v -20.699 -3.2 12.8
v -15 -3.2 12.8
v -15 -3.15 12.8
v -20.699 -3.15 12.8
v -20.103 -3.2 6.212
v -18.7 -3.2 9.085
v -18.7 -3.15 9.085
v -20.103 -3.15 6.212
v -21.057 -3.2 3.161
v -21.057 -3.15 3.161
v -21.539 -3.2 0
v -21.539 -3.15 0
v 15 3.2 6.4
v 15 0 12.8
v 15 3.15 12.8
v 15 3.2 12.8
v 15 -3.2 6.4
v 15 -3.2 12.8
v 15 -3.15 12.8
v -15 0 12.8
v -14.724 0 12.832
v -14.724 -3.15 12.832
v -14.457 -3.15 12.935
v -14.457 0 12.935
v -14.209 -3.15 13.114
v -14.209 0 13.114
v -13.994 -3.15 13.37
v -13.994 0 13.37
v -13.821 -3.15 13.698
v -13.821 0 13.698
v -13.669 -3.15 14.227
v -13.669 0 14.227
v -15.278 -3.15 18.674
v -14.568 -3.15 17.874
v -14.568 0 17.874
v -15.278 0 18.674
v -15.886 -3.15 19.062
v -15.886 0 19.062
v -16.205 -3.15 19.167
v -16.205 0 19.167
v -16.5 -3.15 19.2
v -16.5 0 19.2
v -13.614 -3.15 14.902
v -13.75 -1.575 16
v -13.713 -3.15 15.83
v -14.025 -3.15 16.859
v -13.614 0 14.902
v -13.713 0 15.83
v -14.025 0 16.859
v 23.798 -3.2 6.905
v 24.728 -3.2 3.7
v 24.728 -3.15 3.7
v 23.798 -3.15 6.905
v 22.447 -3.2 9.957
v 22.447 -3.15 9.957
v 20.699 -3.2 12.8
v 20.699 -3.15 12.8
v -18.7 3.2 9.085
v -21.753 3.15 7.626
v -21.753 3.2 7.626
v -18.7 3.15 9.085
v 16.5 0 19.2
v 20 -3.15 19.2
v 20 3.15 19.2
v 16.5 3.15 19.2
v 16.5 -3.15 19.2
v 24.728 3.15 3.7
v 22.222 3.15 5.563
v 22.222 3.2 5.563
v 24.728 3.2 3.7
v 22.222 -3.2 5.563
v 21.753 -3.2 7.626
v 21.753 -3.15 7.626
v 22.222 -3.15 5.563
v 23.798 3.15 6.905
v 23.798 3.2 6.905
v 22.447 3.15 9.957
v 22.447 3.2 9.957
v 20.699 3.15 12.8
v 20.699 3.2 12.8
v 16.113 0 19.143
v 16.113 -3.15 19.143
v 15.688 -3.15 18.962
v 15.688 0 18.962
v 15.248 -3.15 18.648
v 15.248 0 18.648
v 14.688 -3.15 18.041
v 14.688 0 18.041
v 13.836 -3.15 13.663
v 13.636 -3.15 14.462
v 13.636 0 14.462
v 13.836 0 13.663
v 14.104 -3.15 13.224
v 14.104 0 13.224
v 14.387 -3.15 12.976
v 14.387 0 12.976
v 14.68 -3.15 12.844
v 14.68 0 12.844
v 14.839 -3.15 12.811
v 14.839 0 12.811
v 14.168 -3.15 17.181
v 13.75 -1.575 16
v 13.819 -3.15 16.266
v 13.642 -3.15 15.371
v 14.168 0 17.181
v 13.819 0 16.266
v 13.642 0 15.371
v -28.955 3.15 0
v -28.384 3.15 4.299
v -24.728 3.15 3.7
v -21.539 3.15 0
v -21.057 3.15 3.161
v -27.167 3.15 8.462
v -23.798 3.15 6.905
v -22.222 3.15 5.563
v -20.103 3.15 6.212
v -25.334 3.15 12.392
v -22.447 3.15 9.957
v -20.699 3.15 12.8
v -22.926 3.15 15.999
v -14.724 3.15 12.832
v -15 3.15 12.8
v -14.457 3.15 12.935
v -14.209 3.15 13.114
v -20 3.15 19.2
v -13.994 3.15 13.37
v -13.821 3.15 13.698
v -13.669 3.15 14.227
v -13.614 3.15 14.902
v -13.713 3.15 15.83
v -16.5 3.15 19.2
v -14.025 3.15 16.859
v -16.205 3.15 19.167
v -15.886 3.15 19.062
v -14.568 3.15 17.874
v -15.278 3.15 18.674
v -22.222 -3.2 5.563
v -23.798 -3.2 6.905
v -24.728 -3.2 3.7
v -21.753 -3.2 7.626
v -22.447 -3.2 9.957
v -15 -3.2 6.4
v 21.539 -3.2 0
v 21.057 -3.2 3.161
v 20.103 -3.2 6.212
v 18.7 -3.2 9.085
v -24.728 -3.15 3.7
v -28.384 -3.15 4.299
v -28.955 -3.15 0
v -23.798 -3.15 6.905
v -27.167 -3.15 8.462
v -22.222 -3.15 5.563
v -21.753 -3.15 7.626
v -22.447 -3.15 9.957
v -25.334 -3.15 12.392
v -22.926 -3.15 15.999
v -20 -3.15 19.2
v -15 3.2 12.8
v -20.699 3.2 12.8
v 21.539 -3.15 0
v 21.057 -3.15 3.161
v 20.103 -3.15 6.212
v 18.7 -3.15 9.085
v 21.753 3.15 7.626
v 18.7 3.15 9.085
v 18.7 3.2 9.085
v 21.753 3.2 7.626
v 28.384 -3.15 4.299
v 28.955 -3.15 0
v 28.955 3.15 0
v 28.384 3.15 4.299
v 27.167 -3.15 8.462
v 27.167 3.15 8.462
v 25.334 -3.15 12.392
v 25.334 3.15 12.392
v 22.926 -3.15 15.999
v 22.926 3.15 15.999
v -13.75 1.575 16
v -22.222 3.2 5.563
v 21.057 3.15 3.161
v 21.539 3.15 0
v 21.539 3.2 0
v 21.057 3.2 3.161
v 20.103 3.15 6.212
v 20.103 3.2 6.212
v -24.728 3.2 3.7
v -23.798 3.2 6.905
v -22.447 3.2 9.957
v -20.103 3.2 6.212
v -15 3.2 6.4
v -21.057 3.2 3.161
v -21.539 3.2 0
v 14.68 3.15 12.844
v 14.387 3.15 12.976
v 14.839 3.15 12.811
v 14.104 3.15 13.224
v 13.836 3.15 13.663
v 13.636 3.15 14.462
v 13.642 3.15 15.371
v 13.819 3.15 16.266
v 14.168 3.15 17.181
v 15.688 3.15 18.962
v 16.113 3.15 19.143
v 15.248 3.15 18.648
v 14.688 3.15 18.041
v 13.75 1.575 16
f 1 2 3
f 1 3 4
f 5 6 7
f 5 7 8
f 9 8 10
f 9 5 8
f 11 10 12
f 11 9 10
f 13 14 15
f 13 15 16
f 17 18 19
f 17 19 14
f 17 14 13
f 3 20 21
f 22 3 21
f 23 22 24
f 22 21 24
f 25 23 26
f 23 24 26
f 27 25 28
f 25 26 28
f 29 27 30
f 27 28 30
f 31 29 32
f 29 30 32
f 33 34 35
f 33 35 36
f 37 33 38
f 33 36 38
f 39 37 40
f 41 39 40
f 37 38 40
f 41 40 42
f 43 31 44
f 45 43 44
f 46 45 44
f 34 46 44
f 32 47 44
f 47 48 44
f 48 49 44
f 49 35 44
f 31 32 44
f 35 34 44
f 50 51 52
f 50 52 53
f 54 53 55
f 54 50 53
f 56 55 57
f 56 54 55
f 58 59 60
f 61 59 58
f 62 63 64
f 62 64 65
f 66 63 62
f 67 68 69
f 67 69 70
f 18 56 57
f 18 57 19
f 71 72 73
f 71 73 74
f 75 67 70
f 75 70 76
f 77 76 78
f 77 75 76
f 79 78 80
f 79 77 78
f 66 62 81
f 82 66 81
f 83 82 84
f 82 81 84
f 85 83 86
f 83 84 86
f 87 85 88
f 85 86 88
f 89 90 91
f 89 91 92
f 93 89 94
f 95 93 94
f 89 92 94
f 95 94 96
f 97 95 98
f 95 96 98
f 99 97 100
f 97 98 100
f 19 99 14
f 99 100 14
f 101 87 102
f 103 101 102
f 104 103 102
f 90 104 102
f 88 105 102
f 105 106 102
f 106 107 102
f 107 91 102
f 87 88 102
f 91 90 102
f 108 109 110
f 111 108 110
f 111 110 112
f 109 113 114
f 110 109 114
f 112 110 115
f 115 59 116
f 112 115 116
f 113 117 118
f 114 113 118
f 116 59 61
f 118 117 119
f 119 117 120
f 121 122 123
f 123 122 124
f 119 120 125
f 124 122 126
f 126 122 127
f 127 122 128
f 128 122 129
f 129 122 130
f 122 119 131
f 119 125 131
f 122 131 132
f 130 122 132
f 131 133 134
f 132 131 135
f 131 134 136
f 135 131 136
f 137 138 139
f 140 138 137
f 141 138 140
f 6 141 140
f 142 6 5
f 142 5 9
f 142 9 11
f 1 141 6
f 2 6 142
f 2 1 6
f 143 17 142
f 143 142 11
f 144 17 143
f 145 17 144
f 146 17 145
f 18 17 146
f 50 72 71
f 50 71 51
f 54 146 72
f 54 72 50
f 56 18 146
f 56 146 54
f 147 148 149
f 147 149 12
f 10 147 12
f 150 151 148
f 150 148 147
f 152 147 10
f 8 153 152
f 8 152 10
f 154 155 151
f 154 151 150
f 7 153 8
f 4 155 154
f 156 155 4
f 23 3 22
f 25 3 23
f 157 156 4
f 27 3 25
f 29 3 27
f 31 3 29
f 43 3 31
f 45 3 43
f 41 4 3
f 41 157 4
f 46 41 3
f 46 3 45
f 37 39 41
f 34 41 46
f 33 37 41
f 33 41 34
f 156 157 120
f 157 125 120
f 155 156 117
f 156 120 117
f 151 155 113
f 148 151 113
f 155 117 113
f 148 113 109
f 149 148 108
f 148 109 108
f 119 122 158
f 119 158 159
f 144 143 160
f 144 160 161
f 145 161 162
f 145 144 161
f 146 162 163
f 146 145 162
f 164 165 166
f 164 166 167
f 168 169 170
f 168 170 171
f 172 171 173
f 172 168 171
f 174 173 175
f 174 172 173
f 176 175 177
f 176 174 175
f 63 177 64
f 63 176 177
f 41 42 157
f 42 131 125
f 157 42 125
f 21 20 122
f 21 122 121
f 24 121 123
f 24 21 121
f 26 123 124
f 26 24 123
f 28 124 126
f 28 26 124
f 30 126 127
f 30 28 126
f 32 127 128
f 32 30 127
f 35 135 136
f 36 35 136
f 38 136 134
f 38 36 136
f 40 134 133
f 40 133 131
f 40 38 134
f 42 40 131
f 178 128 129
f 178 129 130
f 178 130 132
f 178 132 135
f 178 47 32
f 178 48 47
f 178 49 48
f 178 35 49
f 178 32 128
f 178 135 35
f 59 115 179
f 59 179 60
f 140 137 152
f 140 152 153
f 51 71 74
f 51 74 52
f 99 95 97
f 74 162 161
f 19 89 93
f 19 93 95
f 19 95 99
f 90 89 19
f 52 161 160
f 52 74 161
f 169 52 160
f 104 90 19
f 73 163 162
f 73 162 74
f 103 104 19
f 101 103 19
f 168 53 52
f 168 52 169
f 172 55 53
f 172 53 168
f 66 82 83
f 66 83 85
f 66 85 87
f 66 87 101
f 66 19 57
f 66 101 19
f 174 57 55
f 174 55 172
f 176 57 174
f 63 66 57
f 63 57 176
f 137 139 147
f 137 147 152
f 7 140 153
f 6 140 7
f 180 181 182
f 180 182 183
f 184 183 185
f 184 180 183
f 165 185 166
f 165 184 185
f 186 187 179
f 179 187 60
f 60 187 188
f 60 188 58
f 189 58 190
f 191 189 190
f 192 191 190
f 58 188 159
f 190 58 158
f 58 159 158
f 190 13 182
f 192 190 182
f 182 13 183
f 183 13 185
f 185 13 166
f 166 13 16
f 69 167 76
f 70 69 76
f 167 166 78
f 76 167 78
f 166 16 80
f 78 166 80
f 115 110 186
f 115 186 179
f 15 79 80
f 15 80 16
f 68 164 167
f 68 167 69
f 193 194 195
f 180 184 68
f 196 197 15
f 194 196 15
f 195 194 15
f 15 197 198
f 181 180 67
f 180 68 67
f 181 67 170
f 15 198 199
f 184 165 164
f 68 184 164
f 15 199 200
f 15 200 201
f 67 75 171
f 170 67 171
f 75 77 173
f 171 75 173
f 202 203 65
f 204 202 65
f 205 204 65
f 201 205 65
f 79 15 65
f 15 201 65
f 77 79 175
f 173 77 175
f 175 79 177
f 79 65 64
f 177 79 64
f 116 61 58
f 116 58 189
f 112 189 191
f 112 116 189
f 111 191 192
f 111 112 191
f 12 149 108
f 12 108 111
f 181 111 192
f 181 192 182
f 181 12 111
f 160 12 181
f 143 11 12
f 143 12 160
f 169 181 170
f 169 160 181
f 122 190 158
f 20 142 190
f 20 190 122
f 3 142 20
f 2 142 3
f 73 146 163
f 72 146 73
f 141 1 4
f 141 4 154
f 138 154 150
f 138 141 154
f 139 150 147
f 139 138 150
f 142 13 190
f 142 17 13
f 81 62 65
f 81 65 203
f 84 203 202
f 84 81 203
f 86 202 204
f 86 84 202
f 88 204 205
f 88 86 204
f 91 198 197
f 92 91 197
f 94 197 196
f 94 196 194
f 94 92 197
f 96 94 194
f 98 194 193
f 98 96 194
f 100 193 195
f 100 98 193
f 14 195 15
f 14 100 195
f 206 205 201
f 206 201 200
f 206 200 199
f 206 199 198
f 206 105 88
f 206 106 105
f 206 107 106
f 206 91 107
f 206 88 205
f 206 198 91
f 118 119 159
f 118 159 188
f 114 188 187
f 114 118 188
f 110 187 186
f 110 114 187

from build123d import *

# Parameters (mm, degrees)
F2_DEPTH = 3.2
F3_DEPTH = 3.15


with BuildPart() as f2:
    # F1 (on Front) → F2 (new body, symmetric)
    with BuildSketch(Plane.XZ):
        with BuildLine():
            Line((-15, 6.4), (-15, 12.8))
            Line((-15, 12.8), (-20.6991873327, 12.8))
            ThreePointArc((-20.6991873327, 12.8), (-23.1740174751, 8.453860578), (-24.7278906085, 3.7))
            Line((-24.7278906085, 3.7), (-22.2216690949, 5.5634498618))
            Line((-22.2216690949, 5.5634498618), (-21.7527165138, 7.6259613264))
            Line((-21.7527165138, 7.6259613264), (-18.7, 9.0853274271))
            ThreePointArc((-18.7, 9.0853274271), (-20.6377910154, 4.7045853769), (-21.5393515296, 0))
            Line((-21.5393515296, 0), (21.5393515296, 0))
            ThreePointArc((21.5393515296, 0), (20.6377910154, 4.7045853769), (18.7, 9.0853274271))
            Line((18.7, 9.0853274271), (21.7527165138, 7.6259613264))
            Line((21.7527165138, 7.6259613264), (22.2216690949, 5.5634498618))
            Line((22.2216690949, 5.5634498618), (24.7278906085, 3.7))
            ThreePointArc((24.7278906085, 3.7), (23.1740174751, 8.453860578), (20.6991873327, 12.8))
            Line((20.6991873327, 12.8), (15, 12.8))
            Line((15, 12.8), (15, 6.4))
            Line((15, 6.4), (-15, 6.4))
        make_face()
    extrude(amount=F2_DEPTH, both=True)

    # F1 (on Front) → F3 (join, symmetric)
    with BuildSketch(Plane.XZ):
        with BuildLine():
            add(Edge.make_bspline(
                [(-15.0000000141, 12.8), (-13, 12.8), (-13.7500000053, 16.0000000226), (-14.5000000106, 19.2000000451), (-16.5000000141, 19.2)],
                knots=[6.0755071268, 6.0755071268, 6.0755071268, 7.6463034607, 7.6463034607, 9.2170997945, 9.2170997945, 9.2170997945], degree=2, weights=[1, 0.7071067787, 1, 0.7071067787, 1]))
            Line((-16.5, 19.2), (-20, 19.2))
            ThreePointArc((-20, 19.2), (-26.3254080652, 10.4618610287), (-28.9551083691, 0))
            Line((-28.9551083691, 0), (-21.5393515296, 0))
            ThreePointArc((-21.5393515296, 0), (-20.6377910154, 4.7045853769), (-18.7, 9.0853274271))
            Line((-18.7, 9.0853274271), (-21.7527165138, 7.6259613264))
            Line((-21.7527165138, 7.6259613264), (-22.2216690949, 5.5634498618))
            Line((-22.2216690949, 5.5634498618), (-24.7278906085, 3.7))
            ThreePointArc((-24.7278906085, 3.7), (-23.1740174751, 8.453860578), (-20.6991873327, 12.8))
            Line((-20.6991873327, 12.8), (-15, 12.8))
        make_face()
        with BuildLine():
            ThreePointArc((18.7, 9.0853274271), (20.6377910154, 4.7045853769), (21.5393515296, 0))
            Line((21.5393515296, 0), (28.9551083691, 0))
            ThreePointArc((28.9551083691, 0), (26.3254080652, 10.4618610287), (20, 19.2))
            Line((20, 19.2), (16.5, 19.2))
            add(Edge.make_bspline(
                [(16.5, 19.2), (14.4999999859, 19.2), (13.7499999859, 16), (12.9999999859, 12.8), (15, 12.8)],
                knots=[0.2076781861, 0.2076781861, 0.2076781861, 1.7784745129, 1.7784745129, 3.3492708397, 3.3492708397, 3.3492708397], degree=2, weights=[1, 0.7071067812, 1, 0.7071067812, 1]))
            Line((15, 12.8), (20.6991873327, 12.8))
            ThreePointArc((20.6991873327, 12.8), (23.1740174751, 8.453860578), (24.7278906085, 3.7))
            Line((24.7278906085, 3.7), (22.2216690949, 5.5634498618))
            Line((22.2216690949, 5.5634498618), (21.7527165138, 7.6259613264))
            Line((21.7527165138, 7.6259613264), (18.7, 9.0853274271))
        make_face()
    extrude(amount=F3_DEPTH, both=True)


solid = f2.part
